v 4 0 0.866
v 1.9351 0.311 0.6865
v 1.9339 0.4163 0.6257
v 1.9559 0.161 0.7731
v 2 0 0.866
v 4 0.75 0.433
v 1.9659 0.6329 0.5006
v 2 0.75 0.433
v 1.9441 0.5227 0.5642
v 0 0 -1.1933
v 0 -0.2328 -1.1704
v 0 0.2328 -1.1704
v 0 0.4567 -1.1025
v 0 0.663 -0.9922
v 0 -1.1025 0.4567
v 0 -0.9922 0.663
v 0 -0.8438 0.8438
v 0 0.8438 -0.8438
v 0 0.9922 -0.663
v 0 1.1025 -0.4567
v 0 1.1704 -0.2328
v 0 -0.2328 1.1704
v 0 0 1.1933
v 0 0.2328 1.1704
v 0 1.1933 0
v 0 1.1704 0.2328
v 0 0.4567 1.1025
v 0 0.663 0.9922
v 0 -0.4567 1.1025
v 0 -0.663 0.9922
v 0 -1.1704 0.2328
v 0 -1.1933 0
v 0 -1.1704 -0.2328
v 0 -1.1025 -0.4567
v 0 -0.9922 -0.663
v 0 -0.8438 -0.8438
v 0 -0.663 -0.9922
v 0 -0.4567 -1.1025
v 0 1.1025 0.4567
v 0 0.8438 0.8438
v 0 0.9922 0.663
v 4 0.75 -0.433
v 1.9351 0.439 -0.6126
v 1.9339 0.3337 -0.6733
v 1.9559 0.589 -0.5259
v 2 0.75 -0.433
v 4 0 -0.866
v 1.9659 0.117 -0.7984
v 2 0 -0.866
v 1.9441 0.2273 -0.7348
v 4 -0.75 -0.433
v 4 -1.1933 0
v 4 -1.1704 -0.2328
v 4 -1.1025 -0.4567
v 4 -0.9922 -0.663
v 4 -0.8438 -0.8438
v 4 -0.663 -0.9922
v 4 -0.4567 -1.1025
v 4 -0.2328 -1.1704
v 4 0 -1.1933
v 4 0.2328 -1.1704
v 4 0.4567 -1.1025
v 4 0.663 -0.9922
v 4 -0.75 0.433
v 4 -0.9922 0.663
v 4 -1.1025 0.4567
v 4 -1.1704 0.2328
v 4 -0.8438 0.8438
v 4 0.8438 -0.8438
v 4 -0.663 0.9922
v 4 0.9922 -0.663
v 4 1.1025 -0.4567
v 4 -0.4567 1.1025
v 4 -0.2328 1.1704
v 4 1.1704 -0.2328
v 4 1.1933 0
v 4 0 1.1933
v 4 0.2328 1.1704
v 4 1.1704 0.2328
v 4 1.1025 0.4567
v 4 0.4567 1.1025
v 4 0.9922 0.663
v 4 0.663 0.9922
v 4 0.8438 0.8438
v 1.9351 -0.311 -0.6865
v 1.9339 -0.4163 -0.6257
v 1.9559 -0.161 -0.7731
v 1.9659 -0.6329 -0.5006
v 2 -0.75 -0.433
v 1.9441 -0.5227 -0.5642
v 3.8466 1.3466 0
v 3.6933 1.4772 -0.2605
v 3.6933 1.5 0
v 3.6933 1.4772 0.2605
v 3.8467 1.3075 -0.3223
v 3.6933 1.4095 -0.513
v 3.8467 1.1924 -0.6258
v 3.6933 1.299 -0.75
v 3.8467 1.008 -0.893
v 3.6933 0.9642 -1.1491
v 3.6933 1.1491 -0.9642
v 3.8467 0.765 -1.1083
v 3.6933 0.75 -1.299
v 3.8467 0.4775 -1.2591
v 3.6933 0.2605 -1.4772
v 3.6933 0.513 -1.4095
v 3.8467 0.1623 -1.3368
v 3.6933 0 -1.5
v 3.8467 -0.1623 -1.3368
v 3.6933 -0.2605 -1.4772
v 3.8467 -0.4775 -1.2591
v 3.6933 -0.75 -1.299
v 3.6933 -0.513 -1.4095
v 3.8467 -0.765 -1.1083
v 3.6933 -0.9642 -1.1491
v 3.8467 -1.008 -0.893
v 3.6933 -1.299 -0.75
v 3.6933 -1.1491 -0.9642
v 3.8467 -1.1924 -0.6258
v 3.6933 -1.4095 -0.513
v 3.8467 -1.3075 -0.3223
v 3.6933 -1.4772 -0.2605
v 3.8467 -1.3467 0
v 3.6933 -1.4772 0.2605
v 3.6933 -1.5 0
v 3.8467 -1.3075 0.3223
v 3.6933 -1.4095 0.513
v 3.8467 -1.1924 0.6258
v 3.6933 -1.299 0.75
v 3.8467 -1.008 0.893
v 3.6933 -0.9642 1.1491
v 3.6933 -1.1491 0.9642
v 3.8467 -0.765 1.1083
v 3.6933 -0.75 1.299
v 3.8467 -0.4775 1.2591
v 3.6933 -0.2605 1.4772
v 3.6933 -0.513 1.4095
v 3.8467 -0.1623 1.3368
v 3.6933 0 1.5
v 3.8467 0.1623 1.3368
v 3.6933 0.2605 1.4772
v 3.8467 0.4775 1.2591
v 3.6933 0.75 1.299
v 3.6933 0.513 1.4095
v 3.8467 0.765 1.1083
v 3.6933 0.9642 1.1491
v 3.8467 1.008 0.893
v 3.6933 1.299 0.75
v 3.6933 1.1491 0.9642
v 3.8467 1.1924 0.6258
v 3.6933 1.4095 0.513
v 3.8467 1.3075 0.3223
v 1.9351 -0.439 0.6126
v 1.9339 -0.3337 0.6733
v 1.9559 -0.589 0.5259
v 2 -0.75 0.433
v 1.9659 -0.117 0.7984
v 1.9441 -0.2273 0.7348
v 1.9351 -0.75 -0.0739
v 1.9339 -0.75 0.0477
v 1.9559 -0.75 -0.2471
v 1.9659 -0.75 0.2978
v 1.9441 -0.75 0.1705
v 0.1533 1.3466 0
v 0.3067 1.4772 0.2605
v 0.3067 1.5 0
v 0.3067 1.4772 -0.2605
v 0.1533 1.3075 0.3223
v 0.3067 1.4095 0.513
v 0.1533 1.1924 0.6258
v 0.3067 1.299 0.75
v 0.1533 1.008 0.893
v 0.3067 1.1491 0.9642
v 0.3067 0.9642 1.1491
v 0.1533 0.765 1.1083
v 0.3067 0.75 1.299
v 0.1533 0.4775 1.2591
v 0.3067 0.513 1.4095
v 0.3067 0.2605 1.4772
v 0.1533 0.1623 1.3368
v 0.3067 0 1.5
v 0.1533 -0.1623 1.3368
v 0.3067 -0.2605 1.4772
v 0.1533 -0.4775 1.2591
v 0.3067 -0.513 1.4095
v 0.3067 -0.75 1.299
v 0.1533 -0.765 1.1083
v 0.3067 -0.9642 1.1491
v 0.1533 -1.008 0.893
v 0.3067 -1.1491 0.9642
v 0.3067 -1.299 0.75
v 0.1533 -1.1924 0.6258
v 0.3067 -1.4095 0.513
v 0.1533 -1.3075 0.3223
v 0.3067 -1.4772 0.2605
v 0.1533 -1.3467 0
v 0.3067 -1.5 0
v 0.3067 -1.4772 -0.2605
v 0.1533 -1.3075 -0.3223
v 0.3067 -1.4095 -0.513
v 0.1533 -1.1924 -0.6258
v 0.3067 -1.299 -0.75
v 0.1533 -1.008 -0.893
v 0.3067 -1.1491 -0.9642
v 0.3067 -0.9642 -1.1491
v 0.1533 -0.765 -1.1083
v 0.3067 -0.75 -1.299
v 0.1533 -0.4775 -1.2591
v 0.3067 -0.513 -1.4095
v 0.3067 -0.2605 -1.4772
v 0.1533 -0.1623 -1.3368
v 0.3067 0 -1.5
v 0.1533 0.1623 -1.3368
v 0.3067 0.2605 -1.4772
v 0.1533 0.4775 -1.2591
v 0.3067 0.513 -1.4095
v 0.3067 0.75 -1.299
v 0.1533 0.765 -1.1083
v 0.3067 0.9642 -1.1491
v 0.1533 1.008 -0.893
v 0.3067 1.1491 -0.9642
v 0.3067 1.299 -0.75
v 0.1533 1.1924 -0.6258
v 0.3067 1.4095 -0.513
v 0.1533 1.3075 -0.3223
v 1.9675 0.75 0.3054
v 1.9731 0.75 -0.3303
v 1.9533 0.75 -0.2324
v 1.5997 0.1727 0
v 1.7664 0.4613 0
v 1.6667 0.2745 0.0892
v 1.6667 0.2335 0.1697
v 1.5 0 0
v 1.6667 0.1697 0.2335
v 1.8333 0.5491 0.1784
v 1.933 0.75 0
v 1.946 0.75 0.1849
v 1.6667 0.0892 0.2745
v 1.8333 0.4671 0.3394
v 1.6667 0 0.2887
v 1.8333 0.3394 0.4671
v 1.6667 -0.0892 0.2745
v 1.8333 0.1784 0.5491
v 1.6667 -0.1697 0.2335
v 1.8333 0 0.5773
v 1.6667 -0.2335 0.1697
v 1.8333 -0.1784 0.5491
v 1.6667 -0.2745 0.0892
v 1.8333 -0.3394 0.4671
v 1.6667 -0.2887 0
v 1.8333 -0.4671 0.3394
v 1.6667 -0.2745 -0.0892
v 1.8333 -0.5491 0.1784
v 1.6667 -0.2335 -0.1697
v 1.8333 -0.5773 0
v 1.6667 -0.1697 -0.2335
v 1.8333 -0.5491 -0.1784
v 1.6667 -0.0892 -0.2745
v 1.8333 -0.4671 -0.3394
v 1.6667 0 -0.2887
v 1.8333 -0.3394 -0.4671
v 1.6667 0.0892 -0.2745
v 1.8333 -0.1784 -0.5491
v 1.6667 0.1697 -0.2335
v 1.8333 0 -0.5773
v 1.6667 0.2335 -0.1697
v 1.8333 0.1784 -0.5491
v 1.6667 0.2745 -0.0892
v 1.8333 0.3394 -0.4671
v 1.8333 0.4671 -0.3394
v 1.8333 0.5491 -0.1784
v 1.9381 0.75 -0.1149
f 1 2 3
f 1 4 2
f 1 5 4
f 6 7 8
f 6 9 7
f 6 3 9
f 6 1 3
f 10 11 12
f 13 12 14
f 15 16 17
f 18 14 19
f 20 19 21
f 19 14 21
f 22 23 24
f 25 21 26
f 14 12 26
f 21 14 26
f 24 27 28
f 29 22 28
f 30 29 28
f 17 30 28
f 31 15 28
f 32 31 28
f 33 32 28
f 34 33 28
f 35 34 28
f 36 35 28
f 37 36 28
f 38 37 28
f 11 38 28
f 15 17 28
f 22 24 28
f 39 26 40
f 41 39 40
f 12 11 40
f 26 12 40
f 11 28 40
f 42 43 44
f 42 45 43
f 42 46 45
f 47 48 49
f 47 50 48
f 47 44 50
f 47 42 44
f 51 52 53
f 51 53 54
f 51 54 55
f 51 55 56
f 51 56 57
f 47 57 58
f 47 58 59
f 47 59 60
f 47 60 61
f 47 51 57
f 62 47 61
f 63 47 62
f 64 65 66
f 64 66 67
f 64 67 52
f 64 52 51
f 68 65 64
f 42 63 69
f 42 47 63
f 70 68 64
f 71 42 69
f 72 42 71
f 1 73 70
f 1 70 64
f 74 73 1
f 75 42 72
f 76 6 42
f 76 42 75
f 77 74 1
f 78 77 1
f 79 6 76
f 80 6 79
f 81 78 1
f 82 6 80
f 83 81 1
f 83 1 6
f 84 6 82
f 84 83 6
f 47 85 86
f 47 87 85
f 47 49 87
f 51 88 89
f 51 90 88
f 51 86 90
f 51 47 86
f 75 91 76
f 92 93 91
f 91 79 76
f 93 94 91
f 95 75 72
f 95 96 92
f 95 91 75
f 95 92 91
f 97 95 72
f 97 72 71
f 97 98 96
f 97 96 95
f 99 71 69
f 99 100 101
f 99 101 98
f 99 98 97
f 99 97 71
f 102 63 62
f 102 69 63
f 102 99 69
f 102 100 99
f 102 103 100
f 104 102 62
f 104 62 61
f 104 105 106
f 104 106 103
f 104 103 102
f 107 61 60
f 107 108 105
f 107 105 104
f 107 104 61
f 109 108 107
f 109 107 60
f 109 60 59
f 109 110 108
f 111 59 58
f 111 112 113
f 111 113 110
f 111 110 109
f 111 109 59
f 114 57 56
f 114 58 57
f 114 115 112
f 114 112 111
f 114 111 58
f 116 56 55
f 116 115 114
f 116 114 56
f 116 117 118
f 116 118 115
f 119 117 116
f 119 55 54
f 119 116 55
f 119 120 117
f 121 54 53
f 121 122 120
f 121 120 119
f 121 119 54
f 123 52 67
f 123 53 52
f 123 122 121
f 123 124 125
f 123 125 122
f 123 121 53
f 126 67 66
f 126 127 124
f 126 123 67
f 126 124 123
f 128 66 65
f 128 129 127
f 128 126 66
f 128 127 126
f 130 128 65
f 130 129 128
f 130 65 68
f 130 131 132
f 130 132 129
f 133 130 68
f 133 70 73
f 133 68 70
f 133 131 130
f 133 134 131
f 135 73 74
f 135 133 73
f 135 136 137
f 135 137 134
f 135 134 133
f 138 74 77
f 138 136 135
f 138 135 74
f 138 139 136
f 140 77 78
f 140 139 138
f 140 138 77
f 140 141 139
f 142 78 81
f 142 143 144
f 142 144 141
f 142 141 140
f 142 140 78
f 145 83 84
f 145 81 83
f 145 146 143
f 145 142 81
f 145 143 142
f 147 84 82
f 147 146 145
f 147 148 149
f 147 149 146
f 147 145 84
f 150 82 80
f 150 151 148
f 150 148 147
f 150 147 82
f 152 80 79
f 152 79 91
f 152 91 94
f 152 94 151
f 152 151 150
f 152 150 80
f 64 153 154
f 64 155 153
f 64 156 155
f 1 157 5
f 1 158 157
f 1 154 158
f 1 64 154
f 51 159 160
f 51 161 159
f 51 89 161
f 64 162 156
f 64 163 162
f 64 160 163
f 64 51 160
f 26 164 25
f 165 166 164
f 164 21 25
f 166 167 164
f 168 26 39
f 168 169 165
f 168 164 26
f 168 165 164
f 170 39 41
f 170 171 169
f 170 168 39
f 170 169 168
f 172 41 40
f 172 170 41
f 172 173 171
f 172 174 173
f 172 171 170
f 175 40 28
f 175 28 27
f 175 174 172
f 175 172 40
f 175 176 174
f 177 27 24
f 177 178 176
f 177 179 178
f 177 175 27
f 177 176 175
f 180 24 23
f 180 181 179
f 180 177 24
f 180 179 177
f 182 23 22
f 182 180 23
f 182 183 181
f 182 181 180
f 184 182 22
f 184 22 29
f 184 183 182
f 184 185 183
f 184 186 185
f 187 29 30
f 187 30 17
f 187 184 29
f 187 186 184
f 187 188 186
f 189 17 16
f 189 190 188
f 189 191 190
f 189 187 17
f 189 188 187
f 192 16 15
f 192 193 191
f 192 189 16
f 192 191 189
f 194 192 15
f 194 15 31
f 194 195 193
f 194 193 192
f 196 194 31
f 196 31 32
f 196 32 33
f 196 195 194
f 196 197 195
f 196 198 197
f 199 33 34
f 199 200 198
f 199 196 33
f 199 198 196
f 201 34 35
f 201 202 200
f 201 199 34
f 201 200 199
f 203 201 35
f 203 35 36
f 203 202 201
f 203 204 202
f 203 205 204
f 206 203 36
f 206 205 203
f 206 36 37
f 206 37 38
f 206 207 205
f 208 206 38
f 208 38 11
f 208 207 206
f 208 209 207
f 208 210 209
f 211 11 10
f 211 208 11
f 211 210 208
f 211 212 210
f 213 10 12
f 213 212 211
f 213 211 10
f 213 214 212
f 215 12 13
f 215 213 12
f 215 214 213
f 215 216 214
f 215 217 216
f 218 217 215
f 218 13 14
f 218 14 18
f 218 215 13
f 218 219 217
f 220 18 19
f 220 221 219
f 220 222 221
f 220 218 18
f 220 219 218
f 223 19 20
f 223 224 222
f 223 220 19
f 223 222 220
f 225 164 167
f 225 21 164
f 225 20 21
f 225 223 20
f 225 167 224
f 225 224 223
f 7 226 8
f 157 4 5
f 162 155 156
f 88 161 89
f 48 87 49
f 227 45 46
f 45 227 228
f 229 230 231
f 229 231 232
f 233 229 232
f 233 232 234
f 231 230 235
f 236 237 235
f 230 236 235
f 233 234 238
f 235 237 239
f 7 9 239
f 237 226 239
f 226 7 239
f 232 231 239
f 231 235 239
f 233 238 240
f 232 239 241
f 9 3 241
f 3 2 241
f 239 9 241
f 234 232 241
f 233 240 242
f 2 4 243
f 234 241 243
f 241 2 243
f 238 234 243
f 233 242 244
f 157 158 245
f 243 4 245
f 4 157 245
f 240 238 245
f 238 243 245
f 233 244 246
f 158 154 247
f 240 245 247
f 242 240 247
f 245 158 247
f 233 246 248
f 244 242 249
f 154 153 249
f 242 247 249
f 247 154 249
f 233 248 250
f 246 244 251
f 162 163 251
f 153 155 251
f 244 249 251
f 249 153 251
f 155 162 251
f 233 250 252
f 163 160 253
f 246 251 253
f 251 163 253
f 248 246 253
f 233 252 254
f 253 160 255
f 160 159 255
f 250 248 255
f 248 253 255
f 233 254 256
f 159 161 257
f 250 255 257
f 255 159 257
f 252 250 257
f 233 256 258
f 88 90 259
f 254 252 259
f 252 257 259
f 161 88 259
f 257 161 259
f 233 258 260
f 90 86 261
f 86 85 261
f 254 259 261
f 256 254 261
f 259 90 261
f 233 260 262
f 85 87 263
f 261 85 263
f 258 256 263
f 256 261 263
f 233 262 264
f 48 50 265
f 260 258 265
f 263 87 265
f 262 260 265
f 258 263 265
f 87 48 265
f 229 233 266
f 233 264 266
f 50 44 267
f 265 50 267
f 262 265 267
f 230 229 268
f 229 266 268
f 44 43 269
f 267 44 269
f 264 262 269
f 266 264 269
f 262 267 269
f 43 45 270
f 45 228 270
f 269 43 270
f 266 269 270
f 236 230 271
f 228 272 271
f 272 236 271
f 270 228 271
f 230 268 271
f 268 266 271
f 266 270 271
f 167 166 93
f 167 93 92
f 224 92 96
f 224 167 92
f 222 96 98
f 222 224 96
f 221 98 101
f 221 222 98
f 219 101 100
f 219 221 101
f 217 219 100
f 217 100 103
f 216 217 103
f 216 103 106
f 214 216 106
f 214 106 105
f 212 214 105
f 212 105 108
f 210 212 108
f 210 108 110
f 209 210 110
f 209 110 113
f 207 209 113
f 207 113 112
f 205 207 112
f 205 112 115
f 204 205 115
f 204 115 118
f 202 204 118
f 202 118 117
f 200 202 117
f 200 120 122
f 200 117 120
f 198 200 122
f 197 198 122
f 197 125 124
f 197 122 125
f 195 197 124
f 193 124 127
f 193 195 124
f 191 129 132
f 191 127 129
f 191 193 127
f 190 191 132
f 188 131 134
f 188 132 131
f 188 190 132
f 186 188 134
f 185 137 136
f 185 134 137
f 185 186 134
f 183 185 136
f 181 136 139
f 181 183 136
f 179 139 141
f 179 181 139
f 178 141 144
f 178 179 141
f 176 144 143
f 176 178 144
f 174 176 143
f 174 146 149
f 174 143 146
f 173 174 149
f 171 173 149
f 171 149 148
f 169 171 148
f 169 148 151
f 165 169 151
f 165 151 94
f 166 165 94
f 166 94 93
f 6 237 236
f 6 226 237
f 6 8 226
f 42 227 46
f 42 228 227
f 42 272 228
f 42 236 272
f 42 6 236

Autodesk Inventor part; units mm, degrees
ref_plane "YZ Plane" through (0, 0, 0) normal (1, 0, 0) x (0, 1, 0)
ref_plane "XZ Plane" through (0, 0, 0) normal (0, 1, 0) x (-1, 0, 0)
sketch "Sketch1" plane through (0, 0, 0) normal (0, 0, 1) x (1, 0, 0)
  line L0 (0, 0) -> (1.5, 0)
  line L1 (4, 0.866) -> (4, 1.5)
  line L2 (4, 1.5) -> (0, 1.5)
  line L3 (4, 0.866) -> (2, 0.866)
  line L4 (2, 0.866) -> (1.5, 0)
  line L5 (0, -0.3) -> (0, 1.8) projected
  line L6 (0, 1.5) -> (0, 0)
  dimension "d0" = 2
  dimension "d1" = 60
  dimension "d2" = 3
  dimension "d3" = 1.7321
  dimension "d5" = 4
revolve "Body" add sketch "Sketch1" angle 360 about axis through (0, 0, 0) along (1, 0, 0)
chamfer "Chamfer1" distance 0.3067 angle 45 1 edges at (4, -1.5, 0) measured on face at (4, 1.2658, -0.1887)
sketch "Sketch2" plane through (4, 0, 0) normal (1, 0, 0) x (0, 0, -1)
  circle A0 centre (0, 0) radius 0.866 projected
  line L0 (-0.433, 0.75) -> (0.433, 0.75)
  line L1 (0.433, 0.75) -> (0.866, 0)
  line L2 (0.866, 0) -> (0.433, -0.75)
  line L3 (0.433, -0.75) -> (-0.433, -0.75)
  line L4 (-0.433, -0.75) -> (-0.866, 0)
  line L5 (-0.866, 0) -> (-0.433, 0.75)
  point P0 (0, 0)
  point P1 (0, 0)
extrude "Slot" add sketch "Sketch2" against normal up to next contours L1 A0 | A0 L2 | L0 A0 | A0 L3 | L5 A0 | A0 L4
thread "Thread" size "M3x0.5" class "6g" standard "ISO Metric profile" length 4
chamfer "Chamfer2" distance 0.3067 angle 45 1 edges at (0, -1.5, 0) measured on face at (2.4622, 1.4806, -0.2406)
ref_plane "Work Plane1" through (2, 0, 0) normal (0, 0.5, 0.866) x (1, 0, 0)
equation "\"d7\" = -0.5 * GD1 + 0.5 * NND"
equation "\"d8\" = FAWI"
equation "\"d29\" = -0.5 * GD1 + 0.5 * NND"
equation "\"d11\" = NLG"
equation "\"d13\" = -0.5 * GD1 + 0.5 * NND"
equation "\"d14\" = FAWI"
equation "\"d30\" = -0.5 * GD1 + 0.5 * NND"
equation "\"d0\" = INTI"
equation "\"d2\" = NND"
equation "\"d3\" = 1.1547 * SW"
equation "\"d5\" = NLG"
equation "\"NND\" = 3"
equation "\"NLG\" = 4"
equation "\"INTI\" = 2"
equation "\"FAWI\" = 45deg"
equation "\"SW\" = 1.5"
equation "\"GD1\" = THREADDIA - 1.2269 * PTC"
equation "\"FAWI1\" = 45deg"
equation "\"GUL\" = 0.61345 * PTC"
equation "\"SPD\" = 2"
equation "\"SEWI\" = 90deg"
equation "\"TOA\" = 30deg"
equation "\"THREADDIA\" = 3"
equation "\"PTC\" = 0.5"
equation "\"GAL\" = 0.61345 * PTC"
equation "\"E0\" = 1.155 * SW"
properties part number "ISO 4026 - M3 x 4" material "Stainless Steel, 440C"
